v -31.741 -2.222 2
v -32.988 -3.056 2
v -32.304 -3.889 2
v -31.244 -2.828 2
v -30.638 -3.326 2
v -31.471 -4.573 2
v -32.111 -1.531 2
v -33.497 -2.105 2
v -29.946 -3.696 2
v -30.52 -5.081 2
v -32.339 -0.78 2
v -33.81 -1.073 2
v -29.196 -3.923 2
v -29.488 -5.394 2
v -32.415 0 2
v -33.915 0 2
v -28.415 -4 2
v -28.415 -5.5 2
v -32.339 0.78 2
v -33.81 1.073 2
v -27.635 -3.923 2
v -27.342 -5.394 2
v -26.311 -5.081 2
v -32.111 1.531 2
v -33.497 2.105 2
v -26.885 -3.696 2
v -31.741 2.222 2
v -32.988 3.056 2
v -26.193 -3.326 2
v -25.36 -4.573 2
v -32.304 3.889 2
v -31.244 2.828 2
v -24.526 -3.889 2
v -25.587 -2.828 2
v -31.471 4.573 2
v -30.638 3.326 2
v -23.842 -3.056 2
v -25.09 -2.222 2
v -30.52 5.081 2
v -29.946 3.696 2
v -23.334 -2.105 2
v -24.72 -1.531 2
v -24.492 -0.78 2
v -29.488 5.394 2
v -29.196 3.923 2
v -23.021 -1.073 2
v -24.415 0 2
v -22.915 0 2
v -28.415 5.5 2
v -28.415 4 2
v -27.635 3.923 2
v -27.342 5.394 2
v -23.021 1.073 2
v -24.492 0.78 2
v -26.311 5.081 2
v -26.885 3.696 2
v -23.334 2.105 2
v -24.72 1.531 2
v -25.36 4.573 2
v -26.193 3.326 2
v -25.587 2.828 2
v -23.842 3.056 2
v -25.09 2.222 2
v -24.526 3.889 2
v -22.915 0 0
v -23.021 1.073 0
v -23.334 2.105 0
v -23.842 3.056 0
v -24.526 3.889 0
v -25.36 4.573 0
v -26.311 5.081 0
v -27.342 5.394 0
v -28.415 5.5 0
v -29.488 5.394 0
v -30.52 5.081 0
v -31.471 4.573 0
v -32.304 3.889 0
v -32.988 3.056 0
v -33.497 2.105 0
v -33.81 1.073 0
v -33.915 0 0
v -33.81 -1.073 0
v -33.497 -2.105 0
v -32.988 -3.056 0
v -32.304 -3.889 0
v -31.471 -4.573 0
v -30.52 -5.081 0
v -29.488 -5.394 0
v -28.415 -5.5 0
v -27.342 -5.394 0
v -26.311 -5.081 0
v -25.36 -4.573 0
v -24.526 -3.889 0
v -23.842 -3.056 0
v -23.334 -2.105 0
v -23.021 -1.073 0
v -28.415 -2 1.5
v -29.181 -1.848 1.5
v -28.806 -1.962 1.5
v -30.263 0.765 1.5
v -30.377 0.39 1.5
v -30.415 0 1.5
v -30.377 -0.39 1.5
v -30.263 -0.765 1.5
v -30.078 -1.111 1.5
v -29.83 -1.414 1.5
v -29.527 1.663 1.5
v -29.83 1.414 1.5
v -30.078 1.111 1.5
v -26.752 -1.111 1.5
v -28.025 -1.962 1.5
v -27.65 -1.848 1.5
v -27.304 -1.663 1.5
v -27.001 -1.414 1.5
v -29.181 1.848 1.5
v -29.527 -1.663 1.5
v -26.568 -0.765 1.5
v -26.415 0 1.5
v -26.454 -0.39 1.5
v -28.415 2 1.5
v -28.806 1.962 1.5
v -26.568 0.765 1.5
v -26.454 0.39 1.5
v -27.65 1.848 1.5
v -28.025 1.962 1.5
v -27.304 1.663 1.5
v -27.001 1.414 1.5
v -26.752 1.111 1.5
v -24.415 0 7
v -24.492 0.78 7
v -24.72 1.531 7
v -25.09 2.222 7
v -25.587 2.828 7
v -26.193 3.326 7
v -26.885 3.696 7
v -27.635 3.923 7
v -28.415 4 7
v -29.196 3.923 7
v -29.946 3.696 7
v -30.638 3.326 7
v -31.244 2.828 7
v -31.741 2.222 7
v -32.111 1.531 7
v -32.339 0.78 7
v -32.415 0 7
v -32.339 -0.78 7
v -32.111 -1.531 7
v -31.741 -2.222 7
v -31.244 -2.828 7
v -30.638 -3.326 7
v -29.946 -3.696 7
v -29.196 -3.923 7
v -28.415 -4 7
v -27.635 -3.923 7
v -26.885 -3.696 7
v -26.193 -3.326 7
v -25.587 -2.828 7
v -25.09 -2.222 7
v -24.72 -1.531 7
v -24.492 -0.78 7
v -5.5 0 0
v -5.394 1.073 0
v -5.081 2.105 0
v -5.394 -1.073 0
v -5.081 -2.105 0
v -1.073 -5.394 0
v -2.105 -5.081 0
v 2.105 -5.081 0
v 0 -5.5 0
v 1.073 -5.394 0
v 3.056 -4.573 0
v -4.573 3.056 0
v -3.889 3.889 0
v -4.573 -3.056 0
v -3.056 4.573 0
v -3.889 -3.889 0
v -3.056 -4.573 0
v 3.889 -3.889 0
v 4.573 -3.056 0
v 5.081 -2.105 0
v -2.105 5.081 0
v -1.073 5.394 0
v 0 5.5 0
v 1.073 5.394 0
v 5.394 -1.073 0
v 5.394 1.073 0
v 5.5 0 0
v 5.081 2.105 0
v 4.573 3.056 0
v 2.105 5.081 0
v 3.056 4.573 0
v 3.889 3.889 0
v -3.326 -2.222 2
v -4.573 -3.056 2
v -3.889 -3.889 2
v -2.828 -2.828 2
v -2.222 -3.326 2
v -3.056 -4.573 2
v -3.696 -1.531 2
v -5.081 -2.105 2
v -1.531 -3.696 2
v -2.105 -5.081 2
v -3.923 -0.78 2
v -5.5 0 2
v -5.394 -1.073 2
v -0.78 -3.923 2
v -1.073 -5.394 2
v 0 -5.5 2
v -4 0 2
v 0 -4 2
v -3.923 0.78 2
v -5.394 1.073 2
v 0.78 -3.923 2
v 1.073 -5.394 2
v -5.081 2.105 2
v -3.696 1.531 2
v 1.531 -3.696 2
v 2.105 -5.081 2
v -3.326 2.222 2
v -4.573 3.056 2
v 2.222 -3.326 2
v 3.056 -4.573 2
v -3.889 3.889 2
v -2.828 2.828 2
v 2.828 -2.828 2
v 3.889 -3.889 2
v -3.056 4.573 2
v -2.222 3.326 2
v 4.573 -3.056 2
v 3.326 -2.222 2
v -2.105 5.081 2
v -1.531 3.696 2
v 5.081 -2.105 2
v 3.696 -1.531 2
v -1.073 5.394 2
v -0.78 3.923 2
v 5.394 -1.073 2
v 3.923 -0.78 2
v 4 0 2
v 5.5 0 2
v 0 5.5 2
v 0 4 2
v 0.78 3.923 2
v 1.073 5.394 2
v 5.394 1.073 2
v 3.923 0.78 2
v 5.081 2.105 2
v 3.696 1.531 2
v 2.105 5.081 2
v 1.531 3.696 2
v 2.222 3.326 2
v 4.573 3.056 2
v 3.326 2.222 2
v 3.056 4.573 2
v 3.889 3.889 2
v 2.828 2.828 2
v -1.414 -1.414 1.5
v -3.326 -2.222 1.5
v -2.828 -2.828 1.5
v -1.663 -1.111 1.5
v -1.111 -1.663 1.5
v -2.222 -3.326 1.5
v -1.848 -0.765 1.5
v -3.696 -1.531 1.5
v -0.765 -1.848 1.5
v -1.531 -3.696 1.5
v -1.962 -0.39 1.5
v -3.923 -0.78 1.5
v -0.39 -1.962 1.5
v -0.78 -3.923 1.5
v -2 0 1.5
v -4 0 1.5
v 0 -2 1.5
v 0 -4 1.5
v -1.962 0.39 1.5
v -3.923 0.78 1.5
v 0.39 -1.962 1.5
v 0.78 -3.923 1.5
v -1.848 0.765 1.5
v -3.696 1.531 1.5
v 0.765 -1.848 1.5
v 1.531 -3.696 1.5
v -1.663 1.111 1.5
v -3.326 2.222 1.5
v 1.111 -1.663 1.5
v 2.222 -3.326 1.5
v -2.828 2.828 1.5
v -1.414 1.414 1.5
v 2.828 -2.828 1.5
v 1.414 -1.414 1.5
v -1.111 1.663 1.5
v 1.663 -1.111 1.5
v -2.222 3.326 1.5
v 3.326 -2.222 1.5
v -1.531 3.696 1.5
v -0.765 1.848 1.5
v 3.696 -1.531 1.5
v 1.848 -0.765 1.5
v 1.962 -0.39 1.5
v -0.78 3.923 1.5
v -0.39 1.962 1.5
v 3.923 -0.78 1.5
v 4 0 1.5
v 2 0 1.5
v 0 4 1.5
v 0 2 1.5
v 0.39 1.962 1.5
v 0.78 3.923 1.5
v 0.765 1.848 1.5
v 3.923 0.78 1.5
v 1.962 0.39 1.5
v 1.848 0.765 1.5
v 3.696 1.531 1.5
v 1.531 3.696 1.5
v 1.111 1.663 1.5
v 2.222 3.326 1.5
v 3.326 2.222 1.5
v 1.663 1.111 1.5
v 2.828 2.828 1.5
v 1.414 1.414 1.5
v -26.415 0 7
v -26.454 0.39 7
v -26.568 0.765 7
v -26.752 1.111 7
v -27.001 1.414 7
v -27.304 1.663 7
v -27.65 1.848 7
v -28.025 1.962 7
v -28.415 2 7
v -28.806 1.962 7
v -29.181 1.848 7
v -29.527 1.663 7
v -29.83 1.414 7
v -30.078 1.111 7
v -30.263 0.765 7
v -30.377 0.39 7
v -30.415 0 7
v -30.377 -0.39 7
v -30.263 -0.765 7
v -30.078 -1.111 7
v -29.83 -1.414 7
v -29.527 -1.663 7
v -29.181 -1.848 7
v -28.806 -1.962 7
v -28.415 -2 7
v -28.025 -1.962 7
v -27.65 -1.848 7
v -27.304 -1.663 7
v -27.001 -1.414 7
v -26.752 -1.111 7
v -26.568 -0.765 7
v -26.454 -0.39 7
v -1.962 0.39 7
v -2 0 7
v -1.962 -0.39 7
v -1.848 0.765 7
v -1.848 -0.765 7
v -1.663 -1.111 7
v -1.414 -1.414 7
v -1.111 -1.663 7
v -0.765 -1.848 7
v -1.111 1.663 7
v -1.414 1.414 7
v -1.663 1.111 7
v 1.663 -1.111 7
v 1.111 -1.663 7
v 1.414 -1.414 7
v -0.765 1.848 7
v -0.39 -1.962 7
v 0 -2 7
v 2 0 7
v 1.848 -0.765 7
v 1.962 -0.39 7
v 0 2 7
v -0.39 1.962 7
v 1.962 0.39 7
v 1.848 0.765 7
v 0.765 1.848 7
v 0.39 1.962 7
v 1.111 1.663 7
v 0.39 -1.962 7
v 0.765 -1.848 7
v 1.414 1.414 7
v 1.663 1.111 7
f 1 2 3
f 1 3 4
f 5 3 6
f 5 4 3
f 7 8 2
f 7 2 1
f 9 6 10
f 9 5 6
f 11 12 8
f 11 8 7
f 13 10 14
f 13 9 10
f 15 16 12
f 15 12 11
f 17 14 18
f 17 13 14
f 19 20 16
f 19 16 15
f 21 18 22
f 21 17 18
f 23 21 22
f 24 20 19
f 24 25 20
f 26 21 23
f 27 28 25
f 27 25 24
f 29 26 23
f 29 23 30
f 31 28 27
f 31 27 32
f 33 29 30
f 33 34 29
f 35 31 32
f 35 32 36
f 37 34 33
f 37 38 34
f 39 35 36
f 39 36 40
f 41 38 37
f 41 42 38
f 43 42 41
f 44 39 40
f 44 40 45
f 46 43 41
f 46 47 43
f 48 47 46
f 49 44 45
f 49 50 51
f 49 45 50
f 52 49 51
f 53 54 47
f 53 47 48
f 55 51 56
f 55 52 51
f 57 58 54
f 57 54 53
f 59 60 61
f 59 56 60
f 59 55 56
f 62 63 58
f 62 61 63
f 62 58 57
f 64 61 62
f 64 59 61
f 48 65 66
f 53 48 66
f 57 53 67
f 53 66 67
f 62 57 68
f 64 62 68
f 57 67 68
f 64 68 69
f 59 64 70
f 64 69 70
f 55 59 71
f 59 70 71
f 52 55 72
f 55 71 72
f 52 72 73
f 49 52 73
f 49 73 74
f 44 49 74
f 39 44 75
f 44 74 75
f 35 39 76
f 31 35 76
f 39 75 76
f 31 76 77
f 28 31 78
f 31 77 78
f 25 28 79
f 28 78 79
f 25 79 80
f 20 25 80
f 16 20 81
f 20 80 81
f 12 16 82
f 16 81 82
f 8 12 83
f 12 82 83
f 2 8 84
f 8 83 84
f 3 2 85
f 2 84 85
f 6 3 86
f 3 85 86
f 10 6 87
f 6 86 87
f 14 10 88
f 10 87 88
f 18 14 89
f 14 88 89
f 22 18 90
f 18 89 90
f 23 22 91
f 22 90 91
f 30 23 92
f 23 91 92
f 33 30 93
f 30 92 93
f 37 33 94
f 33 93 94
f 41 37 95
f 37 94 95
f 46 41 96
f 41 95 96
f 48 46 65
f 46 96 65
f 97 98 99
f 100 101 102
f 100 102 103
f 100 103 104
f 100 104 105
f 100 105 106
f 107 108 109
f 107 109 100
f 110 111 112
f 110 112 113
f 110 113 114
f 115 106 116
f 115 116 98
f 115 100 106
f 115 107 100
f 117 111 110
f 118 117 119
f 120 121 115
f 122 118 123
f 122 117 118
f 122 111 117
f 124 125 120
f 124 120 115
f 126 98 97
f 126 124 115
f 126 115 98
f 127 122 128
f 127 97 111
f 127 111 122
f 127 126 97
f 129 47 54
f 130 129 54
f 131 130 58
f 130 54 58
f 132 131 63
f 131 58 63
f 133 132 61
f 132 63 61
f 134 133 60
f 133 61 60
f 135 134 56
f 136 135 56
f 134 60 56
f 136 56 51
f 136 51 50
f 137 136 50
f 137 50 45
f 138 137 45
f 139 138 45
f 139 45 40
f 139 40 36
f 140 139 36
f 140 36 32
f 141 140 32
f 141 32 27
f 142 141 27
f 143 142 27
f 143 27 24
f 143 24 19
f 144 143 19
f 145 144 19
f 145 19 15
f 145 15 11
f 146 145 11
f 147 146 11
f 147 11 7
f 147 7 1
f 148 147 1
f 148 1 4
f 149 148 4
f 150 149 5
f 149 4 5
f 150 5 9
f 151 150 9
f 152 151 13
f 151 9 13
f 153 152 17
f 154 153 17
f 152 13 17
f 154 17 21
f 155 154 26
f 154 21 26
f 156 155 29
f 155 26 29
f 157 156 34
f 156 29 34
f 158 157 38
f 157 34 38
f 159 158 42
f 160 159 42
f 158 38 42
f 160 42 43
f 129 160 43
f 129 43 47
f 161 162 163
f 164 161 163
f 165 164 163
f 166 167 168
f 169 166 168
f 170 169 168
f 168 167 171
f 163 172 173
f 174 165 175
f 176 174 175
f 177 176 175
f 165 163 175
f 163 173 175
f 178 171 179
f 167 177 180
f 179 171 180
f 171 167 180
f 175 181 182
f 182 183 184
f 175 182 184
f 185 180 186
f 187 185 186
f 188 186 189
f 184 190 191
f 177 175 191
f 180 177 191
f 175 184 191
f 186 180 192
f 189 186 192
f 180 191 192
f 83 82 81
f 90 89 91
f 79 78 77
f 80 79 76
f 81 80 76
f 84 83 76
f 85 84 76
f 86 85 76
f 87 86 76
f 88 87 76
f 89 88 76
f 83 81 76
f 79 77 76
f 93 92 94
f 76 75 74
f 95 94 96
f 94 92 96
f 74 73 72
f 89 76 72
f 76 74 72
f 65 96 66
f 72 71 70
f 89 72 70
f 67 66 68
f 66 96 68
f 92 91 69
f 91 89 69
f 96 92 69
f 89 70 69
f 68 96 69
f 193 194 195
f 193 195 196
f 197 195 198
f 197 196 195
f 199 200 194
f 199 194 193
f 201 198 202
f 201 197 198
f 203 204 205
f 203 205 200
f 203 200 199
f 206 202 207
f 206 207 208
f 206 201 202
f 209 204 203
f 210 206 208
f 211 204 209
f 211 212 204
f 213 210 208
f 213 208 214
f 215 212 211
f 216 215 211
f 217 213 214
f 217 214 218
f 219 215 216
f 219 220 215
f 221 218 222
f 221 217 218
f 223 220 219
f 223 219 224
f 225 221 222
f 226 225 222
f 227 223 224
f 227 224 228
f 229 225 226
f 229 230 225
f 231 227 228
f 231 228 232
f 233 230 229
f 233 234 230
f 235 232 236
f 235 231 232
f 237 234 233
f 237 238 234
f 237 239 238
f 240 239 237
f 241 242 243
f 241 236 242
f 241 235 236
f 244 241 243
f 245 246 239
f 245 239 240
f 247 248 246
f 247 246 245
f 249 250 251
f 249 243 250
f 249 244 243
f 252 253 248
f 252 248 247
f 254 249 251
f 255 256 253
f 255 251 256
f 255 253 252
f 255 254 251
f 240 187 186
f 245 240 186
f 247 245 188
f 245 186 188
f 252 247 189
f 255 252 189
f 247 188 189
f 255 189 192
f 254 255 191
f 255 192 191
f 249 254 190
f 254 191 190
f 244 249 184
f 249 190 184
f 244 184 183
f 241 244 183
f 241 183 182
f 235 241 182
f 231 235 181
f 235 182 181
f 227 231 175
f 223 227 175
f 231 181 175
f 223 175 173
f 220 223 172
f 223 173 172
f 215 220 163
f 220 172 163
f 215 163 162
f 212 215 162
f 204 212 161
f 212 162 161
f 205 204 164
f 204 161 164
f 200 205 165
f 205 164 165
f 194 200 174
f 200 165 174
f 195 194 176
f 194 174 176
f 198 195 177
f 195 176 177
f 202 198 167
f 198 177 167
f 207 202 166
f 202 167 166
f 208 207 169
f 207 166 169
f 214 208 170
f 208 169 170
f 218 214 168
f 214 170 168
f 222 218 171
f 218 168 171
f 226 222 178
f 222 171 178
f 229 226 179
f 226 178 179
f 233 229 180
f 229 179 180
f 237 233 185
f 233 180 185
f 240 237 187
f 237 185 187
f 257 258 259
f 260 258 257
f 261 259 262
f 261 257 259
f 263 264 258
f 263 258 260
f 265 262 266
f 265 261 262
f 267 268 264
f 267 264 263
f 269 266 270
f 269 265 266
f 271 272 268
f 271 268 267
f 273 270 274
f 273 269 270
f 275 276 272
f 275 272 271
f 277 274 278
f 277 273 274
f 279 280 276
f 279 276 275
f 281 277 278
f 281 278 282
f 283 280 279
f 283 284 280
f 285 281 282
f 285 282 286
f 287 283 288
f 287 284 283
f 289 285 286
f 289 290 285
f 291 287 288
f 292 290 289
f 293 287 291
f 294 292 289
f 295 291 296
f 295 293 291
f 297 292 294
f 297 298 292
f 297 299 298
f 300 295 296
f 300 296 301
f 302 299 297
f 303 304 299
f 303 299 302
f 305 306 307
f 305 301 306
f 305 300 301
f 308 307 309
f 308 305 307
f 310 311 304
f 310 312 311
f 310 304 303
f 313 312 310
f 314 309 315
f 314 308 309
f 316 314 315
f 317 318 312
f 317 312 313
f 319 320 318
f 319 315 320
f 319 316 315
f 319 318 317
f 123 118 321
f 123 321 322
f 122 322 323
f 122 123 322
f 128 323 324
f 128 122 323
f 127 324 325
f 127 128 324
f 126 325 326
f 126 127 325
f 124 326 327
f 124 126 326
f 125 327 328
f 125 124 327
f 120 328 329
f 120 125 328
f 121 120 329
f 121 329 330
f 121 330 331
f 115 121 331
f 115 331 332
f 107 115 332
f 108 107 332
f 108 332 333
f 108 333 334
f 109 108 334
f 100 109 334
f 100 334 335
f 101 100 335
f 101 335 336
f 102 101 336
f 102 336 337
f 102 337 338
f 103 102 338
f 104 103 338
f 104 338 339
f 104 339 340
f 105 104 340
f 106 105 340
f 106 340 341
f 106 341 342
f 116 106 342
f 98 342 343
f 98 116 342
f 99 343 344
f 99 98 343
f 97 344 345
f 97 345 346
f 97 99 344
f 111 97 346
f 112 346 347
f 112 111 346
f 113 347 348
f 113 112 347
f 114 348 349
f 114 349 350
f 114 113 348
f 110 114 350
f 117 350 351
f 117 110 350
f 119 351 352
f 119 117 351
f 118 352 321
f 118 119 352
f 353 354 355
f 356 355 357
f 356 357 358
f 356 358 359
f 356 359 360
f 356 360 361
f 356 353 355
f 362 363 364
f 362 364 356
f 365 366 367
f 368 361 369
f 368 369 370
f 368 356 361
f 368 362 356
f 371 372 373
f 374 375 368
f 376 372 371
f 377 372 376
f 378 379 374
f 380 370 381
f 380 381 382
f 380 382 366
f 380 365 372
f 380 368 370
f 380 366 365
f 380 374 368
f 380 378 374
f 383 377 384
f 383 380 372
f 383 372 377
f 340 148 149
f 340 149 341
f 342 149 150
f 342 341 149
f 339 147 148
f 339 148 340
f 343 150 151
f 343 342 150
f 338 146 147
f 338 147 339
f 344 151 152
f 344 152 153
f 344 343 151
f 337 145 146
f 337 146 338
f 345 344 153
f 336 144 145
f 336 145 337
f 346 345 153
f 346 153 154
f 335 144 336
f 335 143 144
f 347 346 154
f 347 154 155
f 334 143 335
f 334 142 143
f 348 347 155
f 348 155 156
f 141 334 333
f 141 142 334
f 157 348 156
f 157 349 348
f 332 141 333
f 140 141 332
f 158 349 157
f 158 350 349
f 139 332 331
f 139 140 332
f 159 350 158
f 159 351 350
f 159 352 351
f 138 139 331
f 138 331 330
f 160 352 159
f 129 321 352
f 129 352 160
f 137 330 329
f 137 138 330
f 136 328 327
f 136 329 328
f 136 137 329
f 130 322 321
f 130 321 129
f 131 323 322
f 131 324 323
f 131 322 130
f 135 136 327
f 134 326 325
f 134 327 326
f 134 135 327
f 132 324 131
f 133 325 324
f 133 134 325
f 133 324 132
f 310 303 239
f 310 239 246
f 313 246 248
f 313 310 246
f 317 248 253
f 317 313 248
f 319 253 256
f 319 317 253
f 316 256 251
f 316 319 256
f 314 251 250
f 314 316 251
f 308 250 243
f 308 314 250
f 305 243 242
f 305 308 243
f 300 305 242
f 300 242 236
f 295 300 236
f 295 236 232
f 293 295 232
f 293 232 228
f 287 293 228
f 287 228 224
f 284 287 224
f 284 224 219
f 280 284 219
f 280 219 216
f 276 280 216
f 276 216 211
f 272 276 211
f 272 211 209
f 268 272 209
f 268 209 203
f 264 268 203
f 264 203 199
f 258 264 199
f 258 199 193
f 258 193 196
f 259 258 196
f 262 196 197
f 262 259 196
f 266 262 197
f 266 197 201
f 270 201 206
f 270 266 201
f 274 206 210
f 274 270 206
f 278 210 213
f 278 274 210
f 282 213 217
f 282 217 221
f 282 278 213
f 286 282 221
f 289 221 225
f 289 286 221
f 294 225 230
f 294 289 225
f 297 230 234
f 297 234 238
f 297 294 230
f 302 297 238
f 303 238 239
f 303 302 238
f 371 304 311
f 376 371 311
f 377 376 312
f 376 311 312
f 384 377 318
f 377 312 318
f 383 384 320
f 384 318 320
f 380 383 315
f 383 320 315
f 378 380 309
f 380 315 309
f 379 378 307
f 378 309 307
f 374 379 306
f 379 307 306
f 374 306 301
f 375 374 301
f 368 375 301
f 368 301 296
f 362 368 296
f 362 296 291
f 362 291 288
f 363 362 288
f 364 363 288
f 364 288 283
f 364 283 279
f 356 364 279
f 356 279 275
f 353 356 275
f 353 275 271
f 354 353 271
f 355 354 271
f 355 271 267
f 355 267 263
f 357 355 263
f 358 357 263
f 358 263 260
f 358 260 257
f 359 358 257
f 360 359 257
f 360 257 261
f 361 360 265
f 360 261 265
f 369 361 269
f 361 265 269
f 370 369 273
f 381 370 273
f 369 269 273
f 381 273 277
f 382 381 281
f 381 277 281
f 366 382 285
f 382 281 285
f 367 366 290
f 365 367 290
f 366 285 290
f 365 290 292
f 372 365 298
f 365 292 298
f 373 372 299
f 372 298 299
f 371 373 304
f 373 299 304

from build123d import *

# Parameters (mm, degrees)
F0_R     = 5.5
F0_R_2   = 4
F1_DEPTH = 2
F0_R_3   = 2
F2_DEPTH = 7
F3_DEPTH = 1.5
F4_DEPTH = 1.5


with BuildPart() as f1:
    # F0 (on Top) → F1 (new body)
    with BuildSketch(Plane.XY):
        Circle(F0_R)
        Circle(F0_R_2, mode=Mode.SUBTRACT)
    extrude(amount=F1_DEPTH)



with BuildPart() as f1b:
    # F0 (on Top) → F1, piece 2 (new body)
    with BuildSketch(Plane.XY):
        with Locations((-28.4153819084, 0)):
            Circle(F0_R)
        with Locations((-28.4153819084, 0)):
            Circle(F0_R_2, mode=Mode.SUBTRACT)
    extrude(amount=F1_DEPTH)

    # F0 (on Top) → F2 (join)
    with BuildSketch(Plane.XY):
        with Locations((-28.4153819084, 0)):
            Circle(F0_R_2)
        with Locations((-28.4153819084, 0)):
            Circle(F0_R_3, mode=Mode.SUBTRACT)
    extrude(amount=F2_DEPTH)

    # F0 (on Top) → F4 (join)
    with BuildSketch(Plane.XY):
        with Locations((-28.4153819084, 0)):
            Circle(F0_R_3)
    extrude(amount=F4_DEPTH)


with BuildPart() as f2:
    # F0 (on Top) → F2, piece 2 (new body)
    with BuildSketch(Plane.XY):
        Circle(F0_R_3)
    extrude(amount=F2_DEPTH)


with BuildPart() as f1_1:
    add(f1.part)

    add(f2.part)  # F3 merges F2
    # F0 (on Top) → F3 (join)
    with BuildSketch(Plane.XY):
        Circle(F0_R_2)
        Circle(F0_R_3, mode=Mode.SUBTRACT)
    extrude(amount=F3_DEPTH)


solid = Compound([f1b.part, f1_1.part])
